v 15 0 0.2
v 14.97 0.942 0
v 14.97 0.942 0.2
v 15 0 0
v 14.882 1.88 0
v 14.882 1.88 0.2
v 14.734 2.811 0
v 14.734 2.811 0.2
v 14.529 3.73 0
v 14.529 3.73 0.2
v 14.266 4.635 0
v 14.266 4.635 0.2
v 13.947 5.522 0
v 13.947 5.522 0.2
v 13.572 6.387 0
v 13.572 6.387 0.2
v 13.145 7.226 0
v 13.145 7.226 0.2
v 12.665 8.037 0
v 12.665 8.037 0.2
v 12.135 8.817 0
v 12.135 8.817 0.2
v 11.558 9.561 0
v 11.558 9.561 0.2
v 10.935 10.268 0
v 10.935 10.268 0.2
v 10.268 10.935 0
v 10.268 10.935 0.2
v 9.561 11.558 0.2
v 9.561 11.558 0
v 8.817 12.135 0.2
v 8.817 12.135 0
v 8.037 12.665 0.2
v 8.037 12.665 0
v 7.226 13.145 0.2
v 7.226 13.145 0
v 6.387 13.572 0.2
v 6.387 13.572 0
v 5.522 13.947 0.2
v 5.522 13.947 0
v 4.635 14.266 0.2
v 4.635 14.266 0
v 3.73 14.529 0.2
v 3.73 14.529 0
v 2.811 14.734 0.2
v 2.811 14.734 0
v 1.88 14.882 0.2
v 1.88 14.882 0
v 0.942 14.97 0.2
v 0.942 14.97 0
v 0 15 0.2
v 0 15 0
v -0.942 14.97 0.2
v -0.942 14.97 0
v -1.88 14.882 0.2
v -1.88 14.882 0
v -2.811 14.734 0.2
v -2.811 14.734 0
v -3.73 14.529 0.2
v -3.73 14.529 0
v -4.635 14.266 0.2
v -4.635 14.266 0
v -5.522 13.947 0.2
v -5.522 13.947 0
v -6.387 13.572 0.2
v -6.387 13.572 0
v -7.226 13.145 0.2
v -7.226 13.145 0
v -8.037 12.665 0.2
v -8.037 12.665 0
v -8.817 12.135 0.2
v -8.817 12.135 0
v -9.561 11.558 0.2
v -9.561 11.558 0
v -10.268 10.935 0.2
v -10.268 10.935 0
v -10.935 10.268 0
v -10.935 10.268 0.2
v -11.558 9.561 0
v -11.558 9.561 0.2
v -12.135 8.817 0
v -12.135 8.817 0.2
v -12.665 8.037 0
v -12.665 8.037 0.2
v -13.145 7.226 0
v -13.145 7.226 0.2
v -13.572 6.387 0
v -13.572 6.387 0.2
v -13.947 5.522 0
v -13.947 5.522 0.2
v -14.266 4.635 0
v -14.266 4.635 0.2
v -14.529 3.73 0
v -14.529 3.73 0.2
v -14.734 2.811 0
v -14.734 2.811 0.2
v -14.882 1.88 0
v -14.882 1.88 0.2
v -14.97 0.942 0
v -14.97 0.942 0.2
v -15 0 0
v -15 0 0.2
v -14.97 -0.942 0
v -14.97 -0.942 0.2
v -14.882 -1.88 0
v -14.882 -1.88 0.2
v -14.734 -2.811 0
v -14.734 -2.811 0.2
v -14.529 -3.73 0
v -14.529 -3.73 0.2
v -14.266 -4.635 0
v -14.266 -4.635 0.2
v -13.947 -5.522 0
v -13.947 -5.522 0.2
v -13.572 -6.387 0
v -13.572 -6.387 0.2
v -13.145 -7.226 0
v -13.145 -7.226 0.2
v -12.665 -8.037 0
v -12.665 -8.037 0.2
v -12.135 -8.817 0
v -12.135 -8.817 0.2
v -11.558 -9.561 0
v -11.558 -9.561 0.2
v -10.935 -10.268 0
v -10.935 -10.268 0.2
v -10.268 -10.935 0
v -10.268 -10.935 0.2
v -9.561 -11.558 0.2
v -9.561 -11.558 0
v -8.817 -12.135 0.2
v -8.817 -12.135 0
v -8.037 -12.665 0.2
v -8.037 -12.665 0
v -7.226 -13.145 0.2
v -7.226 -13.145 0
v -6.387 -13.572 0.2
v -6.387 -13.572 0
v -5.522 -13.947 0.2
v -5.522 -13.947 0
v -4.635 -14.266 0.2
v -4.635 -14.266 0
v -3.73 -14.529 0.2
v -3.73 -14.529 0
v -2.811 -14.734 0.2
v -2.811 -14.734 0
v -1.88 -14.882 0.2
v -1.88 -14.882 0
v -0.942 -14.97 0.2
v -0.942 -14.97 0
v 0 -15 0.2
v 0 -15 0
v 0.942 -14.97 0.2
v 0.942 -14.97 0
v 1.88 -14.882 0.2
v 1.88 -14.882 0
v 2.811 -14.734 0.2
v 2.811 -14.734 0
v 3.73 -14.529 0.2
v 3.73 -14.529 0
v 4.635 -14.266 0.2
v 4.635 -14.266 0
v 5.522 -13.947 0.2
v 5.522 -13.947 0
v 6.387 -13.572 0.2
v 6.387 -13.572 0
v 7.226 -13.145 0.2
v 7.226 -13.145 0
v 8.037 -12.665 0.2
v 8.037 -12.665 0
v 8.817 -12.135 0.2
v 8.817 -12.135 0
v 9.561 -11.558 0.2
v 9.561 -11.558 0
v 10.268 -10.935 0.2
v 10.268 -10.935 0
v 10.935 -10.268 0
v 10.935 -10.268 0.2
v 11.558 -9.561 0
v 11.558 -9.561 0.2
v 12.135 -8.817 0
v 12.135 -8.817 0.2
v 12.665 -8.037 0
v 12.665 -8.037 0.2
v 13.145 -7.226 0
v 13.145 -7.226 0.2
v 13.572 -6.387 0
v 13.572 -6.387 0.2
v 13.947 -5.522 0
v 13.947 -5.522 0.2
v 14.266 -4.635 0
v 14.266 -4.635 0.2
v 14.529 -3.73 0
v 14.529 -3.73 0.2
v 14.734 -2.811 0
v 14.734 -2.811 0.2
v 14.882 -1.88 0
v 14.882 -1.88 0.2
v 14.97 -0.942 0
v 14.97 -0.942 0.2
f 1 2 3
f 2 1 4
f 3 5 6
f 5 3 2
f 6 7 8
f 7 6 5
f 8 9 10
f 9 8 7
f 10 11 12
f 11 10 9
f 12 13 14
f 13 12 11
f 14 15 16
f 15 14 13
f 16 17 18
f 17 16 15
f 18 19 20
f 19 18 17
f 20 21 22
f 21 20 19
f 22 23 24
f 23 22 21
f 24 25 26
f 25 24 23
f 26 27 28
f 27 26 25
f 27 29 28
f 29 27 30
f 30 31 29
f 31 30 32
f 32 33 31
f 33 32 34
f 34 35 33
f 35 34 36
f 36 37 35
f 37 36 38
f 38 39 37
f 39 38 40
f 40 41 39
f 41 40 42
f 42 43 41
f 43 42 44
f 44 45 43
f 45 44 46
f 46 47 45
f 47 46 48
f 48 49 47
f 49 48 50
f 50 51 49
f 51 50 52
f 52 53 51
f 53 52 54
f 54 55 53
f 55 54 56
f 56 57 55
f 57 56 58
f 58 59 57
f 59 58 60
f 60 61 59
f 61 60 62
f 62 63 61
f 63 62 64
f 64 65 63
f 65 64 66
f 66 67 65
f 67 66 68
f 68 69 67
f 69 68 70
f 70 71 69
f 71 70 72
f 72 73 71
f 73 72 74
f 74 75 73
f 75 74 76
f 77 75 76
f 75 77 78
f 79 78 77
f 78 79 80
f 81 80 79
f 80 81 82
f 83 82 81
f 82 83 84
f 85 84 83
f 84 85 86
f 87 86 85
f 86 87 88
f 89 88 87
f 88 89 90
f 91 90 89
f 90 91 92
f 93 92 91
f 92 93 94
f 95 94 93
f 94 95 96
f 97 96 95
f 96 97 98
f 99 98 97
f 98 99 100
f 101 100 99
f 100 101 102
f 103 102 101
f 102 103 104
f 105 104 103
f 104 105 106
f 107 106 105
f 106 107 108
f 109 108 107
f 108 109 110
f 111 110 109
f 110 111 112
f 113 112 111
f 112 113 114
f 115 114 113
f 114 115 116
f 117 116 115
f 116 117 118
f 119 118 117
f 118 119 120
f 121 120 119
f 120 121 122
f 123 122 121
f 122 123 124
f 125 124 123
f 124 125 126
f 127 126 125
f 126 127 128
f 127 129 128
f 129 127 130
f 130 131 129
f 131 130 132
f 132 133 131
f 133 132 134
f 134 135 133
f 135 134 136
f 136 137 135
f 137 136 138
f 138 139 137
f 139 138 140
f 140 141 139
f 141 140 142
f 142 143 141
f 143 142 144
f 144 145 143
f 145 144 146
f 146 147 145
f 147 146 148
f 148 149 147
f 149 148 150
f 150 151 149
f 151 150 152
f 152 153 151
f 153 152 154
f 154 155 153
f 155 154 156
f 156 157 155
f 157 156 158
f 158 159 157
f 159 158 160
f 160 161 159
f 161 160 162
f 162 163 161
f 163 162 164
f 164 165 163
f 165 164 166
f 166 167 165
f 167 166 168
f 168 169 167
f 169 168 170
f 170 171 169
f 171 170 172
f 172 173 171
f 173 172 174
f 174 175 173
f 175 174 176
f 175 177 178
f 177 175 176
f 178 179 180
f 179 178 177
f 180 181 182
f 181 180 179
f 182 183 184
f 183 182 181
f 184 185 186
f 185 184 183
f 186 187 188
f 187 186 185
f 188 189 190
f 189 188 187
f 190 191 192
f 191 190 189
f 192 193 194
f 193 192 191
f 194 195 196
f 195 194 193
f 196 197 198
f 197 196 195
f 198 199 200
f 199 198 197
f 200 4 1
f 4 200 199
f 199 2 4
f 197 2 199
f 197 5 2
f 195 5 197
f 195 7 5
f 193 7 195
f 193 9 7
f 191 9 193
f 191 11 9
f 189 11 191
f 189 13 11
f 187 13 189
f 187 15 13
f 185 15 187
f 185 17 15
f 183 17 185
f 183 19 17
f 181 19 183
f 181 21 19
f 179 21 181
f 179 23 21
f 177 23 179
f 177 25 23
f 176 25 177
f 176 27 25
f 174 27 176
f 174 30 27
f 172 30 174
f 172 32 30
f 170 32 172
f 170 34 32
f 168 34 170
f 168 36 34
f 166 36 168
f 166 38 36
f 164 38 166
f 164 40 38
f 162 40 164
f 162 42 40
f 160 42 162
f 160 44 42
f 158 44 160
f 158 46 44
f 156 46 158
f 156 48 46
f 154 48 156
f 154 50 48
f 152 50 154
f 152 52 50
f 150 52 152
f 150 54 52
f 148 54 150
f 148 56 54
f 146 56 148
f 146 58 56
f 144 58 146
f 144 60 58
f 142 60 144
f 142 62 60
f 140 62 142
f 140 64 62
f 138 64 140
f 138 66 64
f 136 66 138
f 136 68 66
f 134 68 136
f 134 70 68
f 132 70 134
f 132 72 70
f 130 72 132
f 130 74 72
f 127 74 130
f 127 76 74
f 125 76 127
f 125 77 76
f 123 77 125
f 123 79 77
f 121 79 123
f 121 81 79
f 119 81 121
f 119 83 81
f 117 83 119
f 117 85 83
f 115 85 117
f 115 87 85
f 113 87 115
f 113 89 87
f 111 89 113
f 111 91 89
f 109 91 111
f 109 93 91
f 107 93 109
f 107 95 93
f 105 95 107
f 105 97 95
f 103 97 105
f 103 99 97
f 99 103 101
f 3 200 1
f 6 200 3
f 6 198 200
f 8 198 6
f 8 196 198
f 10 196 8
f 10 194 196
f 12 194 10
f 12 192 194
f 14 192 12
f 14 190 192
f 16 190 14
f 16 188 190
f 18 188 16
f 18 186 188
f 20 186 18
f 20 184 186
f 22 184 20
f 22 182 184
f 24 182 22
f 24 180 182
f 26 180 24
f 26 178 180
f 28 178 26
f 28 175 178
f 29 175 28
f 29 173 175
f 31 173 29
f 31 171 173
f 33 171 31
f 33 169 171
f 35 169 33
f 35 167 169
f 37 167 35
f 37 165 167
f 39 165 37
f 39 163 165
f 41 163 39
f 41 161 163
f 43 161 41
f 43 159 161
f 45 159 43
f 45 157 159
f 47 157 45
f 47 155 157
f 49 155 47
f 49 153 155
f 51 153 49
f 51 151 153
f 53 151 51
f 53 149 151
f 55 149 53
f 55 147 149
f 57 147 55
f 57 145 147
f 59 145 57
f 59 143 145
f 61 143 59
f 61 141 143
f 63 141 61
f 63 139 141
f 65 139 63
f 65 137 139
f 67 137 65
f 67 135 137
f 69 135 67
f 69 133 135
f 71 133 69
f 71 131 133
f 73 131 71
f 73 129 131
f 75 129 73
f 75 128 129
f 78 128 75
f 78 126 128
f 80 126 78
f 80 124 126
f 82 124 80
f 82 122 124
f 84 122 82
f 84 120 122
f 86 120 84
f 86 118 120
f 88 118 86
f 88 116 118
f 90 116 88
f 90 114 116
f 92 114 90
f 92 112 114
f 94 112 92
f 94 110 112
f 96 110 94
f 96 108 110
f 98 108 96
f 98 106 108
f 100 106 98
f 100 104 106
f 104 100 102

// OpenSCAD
$fn = 100; epsilon = 0.01; infinite = 500;

size = 30;
layer_height = 0.2;

cylinder(d=size, h=layer_height);
